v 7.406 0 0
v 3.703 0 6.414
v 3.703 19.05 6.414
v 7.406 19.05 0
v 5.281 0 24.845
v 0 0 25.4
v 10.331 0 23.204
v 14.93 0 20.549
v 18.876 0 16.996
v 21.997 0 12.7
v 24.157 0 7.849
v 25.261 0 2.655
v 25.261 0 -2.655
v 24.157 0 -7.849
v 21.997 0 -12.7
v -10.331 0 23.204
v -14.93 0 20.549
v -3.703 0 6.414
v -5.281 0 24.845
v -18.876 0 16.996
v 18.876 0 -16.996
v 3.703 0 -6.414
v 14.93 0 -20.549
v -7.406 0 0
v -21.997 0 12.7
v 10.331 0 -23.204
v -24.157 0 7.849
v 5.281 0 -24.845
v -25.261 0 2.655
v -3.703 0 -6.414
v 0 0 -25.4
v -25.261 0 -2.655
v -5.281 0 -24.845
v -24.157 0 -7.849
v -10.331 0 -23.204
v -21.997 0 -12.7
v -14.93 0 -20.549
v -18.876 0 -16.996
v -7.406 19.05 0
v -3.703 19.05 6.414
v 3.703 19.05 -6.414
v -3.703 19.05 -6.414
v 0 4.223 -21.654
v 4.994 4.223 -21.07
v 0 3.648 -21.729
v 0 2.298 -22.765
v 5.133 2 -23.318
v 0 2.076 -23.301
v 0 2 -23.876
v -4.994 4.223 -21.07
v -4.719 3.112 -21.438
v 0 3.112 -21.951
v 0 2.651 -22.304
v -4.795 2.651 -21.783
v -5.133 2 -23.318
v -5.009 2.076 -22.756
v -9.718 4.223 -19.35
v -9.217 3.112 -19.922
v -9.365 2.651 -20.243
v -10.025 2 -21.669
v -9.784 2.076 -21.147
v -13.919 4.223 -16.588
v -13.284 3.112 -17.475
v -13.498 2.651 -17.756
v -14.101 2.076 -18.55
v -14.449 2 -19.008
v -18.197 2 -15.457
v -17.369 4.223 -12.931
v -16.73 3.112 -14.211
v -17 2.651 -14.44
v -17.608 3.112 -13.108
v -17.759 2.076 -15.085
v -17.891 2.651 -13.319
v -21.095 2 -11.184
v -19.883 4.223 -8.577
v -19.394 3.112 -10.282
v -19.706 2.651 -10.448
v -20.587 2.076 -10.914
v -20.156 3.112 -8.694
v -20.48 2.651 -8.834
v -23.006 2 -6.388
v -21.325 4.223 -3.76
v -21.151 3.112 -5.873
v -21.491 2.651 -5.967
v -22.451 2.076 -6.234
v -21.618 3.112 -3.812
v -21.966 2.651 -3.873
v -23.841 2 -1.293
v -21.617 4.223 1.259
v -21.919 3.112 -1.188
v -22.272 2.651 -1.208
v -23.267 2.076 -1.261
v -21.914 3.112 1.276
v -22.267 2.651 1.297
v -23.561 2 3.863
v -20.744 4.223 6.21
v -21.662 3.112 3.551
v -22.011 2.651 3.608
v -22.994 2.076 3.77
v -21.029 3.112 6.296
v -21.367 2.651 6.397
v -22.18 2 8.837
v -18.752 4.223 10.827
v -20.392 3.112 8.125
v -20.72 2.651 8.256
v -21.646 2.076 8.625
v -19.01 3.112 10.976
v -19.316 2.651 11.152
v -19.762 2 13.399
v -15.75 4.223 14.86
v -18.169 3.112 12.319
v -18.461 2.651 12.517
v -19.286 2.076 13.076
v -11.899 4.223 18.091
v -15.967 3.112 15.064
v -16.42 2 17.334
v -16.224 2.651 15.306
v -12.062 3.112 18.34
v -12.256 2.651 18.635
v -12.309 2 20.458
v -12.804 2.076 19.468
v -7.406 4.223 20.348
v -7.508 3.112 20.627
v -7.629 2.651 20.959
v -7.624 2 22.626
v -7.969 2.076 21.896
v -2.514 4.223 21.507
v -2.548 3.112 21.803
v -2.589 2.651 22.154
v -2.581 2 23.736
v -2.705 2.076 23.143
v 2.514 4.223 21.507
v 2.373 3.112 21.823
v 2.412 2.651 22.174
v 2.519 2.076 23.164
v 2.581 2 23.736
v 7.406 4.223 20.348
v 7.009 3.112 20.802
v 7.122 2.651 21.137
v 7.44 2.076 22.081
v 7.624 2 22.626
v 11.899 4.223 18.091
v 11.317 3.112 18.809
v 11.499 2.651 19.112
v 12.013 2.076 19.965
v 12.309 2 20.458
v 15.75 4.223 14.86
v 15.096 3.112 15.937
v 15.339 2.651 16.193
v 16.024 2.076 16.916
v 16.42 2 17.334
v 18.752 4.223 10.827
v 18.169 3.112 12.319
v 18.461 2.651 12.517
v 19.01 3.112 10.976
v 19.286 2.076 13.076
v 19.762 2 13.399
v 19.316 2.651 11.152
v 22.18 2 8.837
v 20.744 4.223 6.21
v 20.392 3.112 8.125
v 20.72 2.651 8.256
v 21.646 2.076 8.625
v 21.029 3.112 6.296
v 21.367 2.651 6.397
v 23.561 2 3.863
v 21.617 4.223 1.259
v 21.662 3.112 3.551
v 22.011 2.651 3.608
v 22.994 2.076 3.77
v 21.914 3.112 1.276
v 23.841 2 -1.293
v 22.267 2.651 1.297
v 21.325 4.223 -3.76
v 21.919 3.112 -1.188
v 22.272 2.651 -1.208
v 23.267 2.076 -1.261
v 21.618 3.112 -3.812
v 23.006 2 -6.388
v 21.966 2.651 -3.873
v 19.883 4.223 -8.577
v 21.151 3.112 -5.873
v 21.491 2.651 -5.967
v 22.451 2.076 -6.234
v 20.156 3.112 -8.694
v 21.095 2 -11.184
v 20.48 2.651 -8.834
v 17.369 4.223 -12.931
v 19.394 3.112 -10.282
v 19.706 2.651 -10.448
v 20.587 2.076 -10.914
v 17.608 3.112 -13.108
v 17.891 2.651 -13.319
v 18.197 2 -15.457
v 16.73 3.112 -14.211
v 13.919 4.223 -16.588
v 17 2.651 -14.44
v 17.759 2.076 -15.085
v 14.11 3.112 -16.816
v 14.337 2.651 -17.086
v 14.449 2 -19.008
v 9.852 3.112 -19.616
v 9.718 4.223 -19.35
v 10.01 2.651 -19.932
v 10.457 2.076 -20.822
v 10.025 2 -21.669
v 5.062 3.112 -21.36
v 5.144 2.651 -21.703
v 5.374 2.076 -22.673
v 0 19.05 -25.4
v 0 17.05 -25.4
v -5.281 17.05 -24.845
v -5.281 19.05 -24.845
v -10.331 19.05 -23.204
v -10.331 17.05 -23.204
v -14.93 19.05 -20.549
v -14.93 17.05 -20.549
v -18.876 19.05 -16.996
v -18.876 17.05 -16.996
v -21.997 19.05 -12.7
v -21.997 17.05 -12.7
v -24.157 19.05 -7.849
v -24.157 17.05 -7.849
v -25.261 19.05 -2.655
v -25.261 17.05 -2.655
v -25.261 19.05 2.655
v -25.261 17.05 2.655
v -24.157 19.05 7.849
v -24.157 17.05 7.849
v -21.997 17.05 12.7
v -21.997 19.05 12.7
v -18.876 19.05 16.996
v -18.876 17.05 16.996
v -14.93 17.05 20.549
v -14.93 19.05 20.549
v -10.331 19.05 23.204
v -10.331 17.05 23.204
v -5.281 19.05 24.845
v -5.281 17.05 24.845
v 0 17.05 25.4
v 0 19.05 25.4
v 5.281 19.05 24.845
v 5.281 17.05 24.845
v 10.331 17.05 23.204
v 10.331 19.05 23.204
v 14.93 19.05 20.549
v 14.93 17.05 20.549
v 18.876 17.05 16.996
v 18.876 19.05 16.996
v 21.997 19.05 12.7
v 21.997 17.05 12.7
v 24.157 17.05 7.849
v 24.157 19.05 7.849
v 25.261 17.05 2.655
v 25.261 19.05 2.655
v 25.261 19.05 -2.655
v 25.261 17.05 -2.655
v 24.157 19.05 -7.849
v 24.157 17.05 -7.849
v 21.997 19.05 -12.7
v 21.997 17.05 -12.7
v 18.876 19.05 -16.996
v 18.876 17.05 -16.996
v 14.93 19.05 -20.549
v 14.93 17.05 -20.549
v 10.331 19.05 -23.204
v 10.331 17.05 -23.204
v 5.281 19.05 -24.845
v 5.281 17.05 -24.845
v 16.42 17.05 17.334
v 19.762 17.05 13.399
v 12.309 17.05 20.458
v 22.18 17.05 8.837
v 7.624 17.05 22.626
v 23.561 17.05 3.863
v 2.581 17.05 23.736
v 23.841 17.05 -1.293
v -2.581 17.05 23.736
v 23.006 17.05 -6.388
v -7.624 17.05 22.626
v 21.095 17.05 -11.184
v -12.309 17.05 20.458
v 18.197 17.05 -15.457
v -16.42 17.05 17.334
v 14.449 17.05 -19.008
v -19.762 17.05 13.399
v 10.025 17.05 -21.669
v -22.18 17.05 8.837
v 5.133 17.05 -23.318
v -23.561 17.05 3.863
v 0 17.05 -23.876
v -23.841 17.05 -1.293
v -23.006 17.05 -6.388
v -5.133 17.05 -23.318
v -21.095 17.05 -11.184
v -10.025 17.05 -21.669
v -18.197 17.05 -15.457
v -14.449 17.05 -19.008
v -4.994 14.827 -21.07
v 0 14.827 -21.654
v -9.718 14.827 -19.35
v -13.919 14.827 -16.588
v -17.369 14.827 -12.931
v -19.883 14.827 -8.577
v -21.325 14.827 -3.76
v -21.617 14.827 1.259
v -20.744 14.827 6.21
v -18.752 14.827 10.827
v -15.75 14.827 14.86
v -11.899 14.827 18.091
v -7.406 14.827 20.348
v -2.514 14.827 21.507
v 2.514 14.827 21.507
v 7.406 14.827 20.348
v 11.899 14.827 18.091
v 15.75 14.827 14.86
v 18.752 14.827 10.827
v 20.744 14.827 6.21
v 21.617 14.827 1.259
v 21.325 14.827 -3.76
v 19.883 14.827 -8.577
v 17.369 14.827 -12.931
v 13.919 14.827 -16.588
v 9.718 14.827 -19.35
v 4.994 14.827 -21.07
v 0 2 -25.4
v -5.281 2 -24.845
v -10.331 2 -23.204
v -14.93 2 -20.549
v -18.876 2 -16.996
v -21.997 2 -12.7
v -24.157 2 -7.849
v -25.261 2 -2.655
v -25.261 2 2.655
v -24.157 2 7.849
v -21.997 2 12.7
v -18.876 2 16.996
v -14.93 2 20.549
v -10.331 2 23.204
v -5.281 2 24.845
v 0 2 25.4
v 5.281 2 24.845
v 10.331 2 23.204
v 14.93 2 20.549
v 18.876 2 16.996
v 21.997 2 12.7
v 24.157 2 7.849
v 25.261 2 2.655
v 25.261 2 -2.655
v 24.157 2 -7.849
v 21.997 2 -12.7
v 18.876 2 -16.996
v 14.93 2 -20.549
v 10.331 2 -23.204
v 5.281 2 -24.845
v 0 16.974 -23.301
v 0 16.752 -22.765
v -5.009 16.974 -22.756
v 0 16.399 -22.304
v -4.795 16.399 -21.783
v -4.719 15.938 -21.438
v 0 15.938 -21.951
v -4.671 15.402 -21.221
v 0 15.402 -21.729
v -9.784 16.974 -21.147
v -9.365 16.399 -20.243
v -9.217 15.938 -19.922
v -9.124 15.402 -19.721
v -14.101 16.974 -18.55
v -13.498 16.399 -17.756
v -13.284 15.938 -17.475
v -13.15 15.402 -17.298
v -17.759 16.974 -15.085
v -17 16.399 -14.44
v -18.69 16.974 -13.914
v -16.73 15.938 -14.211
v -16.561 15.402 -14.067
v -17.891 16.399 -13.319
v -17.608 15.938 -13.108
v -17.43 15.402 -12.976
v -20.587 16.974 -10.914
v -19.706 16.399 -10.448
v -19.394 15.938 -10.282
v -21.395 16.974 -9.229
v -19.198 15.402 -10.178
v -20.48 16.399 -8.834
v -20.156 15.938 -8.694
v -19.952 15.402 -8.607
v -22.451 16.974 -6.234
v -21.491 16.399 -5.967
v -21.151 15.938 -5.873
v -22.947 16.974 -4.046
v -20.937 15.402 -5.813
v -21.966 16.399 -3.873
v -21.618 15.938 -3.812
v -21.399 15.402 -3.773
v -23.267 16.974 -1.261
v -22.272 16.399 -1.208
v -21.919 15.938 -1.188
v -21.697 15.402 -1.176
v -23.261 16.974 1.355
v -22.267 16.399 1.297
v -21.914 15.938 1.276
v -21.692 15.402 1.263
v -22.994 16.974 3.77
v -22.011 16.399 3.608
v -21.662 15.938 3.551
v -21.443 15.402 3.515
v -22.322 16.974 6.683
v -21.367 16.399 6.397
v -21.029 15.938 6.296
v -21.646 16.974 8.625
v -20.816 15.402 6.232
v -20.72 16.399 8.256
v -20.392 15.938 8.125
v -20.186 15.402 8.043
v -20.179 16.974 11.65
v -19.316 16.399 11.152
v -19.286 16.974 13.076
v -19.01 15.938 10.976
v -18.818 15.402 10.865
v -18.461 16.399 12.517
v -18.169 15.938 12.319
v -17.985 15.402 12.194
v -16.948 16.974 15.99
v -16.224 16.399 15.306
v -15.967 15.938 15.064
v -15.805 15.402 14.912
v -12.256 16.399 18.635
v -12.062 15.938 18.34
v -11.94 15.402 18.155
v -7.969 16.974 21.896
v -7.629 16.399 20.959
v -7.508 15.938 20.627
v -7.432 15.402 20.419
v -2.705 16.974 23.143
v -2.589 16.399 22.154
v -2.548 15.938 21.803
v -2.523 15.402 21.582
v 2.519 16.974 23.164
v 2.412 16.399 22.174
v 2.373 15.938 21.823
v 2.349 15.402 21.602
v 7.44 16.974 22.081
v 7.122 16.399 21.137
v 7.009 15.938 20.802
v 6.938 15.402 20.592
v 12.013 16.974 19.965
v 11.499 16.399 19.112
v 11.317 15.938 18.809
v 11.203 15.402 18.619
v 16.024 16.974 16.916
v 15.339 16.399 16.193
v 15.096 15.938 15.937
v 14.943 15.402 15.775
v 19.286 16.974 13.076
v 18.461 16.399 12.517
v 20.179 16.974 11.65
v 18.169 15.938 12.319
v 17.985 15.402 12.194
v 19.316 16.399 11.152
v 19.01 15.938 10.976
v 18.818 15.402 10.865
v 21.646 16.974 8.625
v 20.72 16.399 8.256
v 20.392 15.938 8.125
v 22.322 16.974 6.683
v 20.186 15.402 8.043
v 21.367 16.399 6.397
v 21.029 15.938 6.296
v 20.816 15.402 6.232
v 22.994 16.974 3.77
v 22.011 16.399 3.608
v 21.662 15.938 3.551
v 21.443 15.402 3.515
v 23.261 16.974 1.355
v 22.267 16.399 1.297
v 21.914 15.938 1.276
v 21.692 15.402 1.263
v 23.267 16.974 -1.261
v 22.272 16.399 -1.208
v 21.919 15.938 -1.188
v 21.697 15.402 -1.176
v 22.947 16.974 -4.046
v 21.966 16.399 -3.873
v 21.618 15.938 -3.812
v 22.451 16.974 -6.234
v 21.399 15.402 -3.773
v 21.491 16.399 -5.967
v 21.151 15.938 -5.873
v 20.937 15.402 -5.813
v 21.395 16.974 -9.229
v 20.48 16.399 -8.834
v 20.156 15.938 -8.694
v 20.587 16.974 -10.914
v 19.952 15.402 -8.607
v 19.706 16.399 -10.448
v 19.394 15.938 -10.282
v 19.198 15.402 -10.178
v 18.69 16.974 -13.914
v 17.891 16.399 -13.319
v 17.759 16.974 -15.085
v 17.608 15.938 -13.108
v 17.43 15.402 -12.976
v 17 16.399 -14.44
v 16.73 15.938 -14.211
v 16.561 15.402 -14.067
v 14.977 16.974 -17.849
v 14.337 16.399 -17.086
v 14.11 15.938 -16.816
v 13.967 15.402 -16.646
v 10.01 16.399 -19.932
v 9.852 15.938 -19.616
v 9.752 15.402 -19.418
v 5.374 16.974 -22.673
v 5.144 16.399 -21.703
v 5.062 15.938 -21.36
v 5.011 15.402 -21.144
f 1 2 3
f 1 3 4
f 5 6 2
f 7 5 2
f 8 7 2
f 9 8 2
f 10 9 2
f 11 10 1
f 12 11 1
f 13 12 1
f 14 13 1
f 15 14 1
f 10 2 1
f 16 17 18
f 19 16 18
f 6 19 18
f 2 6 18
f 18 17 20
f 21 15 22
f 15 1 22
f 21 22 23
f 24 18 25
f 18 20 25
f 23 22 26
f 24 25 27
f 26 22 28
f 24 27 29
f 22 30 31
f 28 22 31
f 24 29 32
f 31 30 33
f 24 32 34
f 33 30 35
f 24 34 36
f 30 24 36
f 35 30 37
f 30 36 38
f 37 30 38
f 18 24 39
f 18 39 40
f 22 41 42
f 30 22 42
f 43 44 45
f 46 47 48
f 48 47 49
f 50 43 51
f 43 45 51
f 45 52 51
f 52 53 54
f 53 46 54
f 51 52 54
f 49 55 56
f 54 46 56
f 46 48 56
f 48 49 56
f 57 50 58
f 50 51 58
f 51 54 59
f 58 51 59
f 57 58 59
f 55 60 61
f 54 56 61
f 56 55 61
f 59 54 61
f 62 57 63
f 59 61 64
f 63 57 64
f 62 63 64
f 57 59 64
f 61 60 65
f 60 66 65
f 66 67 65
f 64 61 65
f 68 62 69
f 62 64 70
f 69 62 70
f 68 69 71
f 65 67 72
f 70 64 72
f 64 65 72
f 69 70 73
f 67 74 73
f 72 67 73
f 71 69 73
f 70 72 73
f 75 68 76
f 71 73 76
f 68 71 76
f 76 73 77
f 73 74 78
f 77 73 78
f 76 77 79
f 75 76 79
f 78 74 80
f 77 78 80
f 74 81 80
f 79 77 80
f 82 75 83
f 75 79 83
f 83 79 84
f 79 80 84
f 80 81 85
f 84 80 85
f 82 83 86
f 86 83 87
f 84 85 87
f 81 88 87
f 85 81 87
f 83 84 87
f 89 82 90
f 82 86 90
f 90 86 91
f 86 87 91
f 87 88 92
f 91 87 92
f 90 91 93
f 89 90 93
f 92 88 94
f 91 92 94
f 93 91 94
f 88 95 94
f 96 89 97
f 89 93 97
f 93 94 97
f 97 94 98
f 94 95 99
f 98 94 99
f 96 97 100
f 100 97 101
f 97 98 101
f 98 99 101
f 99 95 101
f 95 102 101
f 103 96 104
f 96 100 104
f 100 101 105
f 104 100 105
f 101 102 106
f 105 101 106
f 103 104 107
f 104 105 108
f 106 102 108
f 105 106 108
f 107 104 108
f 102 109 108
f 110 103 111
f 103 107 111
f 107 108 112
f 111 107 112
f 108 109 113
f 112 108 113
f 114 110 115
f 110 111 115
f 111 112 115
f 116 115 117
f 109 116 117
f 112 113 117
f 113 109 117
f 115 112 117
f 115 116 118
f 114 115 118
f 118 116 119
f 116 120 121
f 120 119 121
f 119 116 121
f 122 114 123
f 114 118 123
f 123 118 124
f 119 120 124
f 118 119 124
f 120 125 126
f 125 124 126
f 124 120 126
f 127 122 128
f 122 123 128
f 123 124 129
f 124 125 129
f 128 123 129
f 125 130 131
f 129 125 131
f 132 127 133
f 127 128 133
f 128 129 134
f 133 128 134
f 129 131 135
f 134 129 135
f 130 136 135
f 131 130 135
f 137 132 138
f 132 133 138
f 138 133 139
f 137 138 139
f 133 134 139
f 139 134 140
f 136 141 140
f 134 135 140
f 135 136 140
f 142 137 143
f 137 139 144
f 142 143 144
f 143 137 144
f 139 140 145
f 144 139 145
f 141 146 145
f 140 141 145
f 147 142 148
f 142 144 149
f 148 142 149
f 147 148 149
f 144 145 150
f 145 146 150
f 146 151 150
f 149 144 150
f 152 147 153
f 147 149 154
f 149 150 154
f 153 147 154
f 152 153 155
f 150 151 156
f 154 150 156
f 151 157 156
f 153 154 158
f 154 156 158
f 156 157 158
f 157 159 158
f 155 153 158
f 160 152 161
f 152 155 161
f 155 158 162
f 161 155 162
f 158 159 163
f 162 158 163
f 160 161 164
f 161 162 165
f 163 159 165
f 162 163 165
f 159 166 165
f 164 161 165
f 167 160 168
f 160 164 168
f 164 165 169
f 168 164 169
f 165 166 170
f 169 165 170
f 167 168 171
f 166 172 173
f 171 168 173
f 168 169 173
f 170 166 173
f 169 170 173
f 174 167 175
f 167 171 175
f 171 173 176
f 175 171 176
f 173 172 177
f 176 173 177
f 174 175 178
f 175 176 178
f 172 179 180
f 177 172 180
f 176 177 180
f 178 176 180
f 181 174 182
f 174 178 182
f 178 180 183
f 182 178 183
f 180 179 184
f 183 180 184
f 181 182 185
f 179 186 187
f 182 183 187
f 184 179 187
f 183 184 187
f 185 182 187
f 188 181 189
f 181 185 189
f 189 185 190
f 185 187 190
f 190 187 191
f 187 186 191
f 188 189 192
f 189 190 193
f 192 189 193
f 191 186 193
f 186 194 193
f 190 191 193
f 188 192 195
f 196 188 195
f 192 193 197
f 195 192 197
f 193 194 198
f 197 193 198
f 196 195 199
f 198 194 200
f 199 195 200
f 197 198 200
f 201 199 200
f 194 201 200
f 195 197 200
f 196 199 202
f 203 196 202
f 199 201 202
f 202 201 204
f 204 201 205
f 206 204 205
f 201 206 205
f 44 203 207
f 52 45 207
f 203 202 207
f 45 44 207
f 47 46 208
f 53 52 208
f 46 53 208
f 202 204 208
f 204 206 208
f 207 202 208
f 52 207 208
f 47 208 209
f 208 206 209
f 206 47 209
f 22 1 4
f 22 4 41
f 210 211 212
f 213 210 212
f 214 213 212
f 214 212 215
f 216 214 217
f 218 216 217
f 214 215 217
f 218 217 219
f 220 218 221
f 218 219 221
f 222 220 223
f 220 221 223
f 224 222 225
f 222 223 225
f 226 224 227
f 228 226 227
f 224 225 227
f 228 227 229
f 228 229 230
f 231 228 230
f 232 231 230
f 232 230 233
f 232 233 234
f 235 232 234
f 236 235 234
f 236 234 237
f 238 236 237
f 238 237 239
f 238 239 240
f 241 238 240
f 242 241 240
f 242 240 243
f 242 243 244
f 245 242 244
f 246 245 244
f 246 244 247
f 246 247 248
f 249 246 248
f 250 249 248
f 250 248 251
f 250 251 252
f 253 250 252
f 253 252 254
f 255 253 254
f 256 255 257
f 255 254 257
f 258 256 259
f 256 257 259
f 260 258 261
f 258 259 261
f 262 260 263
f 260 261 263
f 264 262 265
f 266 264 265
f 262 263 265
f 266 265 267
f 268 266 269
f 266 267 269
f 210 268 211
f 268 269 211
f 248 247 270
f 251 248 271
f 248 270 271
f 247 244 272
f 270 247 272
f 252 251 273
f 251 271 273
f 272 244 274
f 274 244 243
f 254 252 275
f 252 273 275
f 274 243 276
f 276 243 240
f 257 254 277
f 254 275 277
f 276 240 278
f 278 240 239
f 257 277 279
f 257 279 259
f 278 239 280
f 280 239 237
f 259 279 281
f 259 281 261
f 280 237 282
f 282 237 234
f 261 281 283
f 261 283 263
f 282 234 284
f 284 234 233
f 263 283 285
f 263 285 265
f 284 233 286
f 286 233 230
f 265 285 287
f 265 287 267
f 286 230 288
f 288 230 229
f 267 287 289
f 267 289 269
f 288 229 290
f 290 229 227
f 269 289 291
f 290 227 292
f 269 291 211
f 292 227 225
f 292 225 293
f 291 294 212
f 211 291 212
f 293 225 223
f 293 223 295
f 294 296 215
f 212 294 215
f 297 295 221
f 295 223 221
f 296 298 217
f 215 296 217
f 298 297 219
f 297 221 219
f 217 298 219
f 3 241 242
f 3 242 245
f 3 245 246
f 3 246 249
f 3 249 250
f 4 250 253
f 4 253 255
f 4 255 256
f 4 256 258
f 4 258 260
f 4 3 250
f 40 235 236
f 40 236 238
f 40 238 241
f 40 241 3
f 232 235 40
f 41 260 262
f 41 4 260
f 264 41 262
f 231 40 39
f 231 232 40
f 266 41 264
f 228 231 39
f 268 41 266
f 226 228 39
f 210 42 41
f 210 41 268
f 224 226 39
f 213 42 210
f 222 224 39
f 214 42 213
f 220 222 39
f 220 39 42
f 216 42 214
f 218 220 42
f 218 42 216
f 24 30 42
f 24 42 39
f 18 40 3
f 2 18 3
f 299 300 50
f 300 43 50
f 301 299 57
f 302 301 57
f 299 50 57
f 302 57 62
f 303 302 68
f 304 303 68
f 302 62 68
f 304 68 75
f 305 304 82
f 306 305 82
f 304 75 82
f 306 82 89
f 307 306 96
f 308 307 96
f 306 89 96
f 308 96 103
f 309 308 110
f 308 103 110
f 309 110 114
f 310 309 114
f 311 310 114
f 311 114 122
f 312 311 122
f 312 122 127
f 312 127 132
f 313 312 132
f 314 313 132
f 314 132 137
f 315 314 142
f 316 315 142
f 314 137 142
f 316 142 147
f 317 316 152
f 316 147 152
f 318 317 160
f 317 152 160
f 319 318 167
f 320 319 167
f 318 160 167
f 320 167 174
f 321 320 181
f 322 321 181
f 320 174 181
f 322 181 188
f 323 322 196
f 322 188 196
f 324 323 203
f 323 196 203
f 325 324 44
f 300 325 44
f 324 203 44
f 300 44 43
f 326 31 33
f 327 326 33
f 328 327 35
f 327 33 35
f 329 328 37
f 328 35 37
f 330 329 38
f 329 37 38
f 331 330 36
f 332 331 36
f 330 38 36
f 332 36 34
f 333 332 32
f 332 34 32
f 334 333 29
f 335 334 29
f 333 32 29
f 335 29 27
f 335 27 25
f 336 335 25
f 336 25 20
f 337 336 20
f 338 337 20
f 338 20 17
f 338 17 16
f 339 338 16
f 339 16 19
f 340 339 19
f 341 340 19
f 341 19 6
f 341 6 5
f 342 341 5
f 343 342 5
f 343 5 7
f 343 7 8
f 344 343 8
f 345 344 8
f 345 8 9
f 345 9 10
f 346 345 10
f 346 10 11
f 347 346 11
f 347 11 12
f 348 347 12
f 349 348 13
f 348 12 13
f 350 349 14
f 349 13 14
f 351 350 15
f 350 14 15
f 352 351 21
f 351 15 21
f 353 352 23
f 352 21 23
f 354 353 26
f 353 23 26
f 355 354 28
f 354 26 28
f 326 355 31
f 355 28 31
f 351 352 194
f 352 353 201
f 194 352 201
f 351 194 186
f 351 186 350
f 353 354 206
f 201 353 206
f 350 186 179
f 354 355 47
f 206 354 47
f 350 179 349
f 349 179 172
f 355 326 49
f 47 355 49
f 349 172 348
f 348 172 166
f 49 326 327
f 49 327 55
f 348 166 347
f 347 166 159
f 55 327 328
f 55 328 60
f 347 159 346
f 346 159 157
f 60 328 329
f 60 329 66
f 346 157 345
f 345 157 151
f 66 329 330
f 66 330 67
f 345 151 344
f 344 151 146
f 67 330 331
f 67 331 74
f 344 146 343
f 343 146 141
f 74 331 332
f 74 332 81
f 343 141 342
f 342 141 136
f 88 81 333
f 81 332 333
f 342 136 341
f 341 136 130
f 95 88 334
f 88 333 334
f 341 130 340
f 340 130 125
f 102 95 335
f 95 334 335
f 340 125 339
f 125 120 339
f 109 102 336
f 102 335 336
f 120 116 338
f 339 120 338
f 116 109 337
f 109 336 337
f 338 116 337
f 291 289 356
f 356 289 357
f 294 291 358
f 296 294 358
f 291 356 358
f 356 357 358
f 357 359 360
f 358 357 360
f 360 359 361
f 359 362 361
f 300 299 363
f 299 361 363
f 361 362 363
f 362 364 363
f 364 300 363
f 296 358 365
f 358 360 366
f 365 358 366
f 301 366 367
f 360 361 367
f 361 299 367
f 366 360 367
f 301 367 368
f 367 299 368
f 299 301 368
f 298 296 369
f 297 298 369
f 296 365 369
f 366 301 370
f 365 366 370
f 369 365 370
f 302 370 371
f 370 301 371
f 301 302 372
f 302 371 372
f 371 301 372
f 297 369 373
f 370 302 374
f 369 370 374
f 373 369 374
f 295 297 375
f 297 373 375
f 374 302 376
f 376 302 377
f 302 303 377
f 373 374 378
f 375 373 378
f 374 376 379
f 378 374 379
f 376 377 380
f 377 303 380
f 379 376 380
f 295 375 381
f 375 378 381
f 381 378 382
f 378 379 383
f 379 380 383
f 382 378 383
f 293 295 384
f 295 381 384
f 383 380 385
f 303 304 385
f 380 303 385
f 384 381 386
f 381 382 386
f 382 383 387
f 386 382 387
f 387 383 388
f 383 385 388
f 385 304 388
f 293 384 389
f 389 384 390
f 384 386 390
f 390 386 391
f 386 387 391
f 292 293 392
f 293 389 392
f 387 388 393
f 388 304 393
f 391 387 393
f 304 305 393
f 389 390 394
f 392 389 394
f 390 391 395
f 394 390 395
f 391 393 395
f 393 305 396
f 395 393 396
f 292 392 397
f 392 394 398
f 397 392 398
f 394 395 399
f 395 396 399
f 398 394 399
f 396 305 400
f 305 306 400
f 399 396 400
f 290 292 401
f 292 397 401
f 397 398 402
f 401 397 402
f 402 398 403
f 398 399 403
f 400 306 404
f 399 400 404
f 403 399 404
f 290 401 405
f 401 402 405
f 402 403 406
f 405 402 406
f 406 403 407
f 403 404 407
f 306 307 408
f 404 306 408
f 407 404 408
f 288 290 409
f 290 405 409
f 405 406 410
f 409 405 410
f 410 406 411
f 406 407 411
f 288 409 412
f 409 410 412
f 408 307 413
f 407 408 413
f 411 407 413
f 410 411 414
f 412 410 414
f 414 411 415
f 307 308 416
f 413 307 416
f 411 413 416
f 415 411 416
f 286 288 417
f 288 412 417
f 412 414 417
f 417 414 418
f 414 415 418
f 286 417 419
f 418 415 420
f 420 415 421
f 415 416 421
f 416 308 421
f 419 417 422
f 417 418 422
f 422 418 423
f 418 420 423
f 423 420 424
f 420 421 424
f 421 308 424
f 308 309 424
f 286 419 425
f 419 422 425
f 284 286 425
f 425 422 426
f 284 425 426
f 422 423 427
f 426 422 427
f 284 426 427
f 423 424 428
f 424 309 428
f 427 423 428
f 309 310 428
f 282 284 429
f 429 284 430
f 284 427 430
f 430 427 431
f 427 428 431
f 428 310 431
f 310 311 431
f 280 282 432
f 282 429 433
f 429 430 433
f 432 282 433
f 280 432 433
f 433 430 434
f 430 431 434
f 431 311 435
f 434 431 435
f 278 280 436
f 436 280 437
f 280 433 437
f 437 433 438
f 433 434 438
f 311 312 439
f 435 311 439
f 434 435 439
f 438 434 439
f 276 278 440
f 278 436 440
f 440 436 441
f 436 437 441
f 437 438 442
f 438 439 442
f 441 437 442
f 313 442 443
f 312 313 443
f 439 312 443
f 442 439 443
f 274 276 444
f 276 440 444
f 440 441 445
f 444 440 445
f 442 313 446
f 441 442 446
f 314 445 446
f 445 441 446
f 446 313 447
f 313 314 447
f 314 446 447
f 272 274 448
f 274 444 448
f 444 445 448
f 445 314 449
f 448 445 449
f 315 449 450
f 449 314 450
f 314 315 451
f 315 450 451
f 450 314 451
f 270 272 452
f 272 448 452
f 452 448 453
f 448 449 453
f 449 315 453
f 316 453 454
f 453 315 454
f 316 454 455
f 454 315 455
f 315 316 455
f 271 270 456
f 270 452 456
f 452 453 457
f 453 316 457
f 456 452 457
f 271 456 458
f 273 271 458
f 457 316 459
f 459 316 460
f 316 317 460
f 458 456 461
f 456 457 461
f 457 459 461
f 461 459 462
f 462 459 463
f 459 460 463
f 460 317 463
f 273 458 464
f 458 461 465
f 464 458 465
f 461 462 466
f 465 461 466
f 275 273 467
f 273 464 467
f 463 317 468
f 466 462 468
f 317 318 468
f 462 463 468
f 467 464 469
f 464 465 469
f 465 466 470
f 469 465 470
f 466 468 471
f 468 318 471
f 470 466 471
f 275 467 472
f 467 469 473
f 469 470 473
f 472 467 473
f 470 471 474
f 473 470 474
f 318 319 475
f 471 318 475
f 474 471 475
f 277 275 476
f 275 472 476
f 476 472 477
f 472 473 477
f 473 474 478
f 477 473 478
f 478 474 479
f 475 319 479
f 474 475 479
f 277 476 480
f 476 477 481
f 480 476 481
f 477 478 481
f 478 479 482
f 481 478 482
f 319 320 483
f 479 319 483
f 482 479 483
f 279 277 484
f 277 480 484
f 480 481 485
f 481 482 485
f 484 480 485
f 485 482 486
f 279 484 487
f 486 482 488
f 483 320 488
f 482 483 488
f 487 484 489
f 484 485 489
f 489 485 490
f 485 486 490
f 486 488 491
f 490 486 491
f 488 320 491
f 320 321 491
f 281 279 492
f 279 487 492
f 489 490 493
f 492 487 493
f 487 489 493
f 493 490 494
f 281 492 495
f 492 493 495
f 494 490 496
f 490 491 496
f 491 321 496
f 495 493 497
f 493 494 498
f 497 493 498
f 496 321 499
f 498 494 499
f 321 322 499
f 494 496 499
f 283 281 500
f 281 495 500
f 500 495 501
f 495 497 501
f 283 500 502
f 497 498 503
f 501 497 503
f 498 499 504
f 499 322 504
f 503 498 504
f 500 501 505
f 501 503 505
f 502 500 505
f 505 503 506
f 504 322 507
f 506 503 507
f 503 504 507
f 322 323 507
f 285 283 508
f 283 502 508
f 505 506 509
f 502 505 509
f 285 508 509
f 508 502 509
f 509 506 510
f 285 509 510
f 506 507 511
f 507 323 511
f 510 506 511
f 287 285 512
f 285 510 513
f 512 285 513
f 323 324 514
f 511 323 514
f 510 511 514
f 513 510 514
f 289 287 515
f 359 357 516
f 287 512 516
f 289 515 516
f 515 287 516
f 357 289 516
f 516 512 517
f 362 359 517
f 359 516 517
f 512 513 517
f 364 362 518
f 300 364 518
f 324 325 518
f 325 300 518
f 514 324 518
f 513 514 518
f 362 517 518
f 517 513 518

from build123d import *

# Parameters (mm, degrees)
SKETCH1_R           = 25.4
SKETCH1_R_2         = 4.8387
BOSS_EXTRUDE1_DEPTH = 19.05
CUT_EXTRUDE1_DEPTH  = 41.659838908


with BuildPart() as part:
    # Sketch1 → Boss-Extrude1 (new body)
    with BuildSketch(Plane(origin=(0, 0, 0), x_dir=(1, 0, 0), z_dir=(0, 1, 0))):
        with Locations(Location((0, 0, 0), (0, 0, 90))):
            Circle(SKETCH1_R)
        with Locations(Location((0, 0, 0), (0, 0, 90))):
            Circle(SKETCH1_R_2, mode=Mode.SUBTRACT)
    extrude(amount=BOSS_EXTRUDE1_DEPTH)

    # Sketch6 → Cut-Extrude1 (cut, through all)
    with BuildSketch(Plane(origin=(0, 19.05, 0), x_dir=(1, 0, 0), z_dir=(0, 1, 0))):
        Polygon((3.702835951, -6.4135), (7.405671903, 0), (3.702835951, 6.4135), (-3.702835951, 6.4135), (-7.405671903, 0), (-3.702835951, -6.4135), align=None)
    extrude(amount=-CUT_EXTRUDE1_DEPTH, mode=Mode.SUBTRACT)

    # Sketch2 → Cut-Revolve1 (revolve, cut)
    with BuildSketch(Plane.XY, mode=Mode.PRIVATE) as cut_revolve1_sk:
        with BuildLine():
            Line((25.4, 17.04975), (23.876, 17.04975))
            ThreePointArc((23.876, 17.04975), (22.304455179, 16.398794821), (21.6535, 14.82725))
            Line((21.6535, 14.82725), (21.6535, 4.22275))
            ThreePointArc((21.6535, 4.22275), (22.304455179, 2.651205179), (23.876, 2.00025))
            Line((23.876, 2.00025), (25.4, 2.00025))
            Line((25.4, 2.00025), (25.4, 17.04975))
        make_face()
    revolve(cut_revolve1_sk.sketch.rotate(Axis((0, 0, 0), (0, 1, 0)), 90), axis=Axis((0, 0, 0), (0, 1, 0)), mode=Mode.SUBTRACT)


solid = part.part
